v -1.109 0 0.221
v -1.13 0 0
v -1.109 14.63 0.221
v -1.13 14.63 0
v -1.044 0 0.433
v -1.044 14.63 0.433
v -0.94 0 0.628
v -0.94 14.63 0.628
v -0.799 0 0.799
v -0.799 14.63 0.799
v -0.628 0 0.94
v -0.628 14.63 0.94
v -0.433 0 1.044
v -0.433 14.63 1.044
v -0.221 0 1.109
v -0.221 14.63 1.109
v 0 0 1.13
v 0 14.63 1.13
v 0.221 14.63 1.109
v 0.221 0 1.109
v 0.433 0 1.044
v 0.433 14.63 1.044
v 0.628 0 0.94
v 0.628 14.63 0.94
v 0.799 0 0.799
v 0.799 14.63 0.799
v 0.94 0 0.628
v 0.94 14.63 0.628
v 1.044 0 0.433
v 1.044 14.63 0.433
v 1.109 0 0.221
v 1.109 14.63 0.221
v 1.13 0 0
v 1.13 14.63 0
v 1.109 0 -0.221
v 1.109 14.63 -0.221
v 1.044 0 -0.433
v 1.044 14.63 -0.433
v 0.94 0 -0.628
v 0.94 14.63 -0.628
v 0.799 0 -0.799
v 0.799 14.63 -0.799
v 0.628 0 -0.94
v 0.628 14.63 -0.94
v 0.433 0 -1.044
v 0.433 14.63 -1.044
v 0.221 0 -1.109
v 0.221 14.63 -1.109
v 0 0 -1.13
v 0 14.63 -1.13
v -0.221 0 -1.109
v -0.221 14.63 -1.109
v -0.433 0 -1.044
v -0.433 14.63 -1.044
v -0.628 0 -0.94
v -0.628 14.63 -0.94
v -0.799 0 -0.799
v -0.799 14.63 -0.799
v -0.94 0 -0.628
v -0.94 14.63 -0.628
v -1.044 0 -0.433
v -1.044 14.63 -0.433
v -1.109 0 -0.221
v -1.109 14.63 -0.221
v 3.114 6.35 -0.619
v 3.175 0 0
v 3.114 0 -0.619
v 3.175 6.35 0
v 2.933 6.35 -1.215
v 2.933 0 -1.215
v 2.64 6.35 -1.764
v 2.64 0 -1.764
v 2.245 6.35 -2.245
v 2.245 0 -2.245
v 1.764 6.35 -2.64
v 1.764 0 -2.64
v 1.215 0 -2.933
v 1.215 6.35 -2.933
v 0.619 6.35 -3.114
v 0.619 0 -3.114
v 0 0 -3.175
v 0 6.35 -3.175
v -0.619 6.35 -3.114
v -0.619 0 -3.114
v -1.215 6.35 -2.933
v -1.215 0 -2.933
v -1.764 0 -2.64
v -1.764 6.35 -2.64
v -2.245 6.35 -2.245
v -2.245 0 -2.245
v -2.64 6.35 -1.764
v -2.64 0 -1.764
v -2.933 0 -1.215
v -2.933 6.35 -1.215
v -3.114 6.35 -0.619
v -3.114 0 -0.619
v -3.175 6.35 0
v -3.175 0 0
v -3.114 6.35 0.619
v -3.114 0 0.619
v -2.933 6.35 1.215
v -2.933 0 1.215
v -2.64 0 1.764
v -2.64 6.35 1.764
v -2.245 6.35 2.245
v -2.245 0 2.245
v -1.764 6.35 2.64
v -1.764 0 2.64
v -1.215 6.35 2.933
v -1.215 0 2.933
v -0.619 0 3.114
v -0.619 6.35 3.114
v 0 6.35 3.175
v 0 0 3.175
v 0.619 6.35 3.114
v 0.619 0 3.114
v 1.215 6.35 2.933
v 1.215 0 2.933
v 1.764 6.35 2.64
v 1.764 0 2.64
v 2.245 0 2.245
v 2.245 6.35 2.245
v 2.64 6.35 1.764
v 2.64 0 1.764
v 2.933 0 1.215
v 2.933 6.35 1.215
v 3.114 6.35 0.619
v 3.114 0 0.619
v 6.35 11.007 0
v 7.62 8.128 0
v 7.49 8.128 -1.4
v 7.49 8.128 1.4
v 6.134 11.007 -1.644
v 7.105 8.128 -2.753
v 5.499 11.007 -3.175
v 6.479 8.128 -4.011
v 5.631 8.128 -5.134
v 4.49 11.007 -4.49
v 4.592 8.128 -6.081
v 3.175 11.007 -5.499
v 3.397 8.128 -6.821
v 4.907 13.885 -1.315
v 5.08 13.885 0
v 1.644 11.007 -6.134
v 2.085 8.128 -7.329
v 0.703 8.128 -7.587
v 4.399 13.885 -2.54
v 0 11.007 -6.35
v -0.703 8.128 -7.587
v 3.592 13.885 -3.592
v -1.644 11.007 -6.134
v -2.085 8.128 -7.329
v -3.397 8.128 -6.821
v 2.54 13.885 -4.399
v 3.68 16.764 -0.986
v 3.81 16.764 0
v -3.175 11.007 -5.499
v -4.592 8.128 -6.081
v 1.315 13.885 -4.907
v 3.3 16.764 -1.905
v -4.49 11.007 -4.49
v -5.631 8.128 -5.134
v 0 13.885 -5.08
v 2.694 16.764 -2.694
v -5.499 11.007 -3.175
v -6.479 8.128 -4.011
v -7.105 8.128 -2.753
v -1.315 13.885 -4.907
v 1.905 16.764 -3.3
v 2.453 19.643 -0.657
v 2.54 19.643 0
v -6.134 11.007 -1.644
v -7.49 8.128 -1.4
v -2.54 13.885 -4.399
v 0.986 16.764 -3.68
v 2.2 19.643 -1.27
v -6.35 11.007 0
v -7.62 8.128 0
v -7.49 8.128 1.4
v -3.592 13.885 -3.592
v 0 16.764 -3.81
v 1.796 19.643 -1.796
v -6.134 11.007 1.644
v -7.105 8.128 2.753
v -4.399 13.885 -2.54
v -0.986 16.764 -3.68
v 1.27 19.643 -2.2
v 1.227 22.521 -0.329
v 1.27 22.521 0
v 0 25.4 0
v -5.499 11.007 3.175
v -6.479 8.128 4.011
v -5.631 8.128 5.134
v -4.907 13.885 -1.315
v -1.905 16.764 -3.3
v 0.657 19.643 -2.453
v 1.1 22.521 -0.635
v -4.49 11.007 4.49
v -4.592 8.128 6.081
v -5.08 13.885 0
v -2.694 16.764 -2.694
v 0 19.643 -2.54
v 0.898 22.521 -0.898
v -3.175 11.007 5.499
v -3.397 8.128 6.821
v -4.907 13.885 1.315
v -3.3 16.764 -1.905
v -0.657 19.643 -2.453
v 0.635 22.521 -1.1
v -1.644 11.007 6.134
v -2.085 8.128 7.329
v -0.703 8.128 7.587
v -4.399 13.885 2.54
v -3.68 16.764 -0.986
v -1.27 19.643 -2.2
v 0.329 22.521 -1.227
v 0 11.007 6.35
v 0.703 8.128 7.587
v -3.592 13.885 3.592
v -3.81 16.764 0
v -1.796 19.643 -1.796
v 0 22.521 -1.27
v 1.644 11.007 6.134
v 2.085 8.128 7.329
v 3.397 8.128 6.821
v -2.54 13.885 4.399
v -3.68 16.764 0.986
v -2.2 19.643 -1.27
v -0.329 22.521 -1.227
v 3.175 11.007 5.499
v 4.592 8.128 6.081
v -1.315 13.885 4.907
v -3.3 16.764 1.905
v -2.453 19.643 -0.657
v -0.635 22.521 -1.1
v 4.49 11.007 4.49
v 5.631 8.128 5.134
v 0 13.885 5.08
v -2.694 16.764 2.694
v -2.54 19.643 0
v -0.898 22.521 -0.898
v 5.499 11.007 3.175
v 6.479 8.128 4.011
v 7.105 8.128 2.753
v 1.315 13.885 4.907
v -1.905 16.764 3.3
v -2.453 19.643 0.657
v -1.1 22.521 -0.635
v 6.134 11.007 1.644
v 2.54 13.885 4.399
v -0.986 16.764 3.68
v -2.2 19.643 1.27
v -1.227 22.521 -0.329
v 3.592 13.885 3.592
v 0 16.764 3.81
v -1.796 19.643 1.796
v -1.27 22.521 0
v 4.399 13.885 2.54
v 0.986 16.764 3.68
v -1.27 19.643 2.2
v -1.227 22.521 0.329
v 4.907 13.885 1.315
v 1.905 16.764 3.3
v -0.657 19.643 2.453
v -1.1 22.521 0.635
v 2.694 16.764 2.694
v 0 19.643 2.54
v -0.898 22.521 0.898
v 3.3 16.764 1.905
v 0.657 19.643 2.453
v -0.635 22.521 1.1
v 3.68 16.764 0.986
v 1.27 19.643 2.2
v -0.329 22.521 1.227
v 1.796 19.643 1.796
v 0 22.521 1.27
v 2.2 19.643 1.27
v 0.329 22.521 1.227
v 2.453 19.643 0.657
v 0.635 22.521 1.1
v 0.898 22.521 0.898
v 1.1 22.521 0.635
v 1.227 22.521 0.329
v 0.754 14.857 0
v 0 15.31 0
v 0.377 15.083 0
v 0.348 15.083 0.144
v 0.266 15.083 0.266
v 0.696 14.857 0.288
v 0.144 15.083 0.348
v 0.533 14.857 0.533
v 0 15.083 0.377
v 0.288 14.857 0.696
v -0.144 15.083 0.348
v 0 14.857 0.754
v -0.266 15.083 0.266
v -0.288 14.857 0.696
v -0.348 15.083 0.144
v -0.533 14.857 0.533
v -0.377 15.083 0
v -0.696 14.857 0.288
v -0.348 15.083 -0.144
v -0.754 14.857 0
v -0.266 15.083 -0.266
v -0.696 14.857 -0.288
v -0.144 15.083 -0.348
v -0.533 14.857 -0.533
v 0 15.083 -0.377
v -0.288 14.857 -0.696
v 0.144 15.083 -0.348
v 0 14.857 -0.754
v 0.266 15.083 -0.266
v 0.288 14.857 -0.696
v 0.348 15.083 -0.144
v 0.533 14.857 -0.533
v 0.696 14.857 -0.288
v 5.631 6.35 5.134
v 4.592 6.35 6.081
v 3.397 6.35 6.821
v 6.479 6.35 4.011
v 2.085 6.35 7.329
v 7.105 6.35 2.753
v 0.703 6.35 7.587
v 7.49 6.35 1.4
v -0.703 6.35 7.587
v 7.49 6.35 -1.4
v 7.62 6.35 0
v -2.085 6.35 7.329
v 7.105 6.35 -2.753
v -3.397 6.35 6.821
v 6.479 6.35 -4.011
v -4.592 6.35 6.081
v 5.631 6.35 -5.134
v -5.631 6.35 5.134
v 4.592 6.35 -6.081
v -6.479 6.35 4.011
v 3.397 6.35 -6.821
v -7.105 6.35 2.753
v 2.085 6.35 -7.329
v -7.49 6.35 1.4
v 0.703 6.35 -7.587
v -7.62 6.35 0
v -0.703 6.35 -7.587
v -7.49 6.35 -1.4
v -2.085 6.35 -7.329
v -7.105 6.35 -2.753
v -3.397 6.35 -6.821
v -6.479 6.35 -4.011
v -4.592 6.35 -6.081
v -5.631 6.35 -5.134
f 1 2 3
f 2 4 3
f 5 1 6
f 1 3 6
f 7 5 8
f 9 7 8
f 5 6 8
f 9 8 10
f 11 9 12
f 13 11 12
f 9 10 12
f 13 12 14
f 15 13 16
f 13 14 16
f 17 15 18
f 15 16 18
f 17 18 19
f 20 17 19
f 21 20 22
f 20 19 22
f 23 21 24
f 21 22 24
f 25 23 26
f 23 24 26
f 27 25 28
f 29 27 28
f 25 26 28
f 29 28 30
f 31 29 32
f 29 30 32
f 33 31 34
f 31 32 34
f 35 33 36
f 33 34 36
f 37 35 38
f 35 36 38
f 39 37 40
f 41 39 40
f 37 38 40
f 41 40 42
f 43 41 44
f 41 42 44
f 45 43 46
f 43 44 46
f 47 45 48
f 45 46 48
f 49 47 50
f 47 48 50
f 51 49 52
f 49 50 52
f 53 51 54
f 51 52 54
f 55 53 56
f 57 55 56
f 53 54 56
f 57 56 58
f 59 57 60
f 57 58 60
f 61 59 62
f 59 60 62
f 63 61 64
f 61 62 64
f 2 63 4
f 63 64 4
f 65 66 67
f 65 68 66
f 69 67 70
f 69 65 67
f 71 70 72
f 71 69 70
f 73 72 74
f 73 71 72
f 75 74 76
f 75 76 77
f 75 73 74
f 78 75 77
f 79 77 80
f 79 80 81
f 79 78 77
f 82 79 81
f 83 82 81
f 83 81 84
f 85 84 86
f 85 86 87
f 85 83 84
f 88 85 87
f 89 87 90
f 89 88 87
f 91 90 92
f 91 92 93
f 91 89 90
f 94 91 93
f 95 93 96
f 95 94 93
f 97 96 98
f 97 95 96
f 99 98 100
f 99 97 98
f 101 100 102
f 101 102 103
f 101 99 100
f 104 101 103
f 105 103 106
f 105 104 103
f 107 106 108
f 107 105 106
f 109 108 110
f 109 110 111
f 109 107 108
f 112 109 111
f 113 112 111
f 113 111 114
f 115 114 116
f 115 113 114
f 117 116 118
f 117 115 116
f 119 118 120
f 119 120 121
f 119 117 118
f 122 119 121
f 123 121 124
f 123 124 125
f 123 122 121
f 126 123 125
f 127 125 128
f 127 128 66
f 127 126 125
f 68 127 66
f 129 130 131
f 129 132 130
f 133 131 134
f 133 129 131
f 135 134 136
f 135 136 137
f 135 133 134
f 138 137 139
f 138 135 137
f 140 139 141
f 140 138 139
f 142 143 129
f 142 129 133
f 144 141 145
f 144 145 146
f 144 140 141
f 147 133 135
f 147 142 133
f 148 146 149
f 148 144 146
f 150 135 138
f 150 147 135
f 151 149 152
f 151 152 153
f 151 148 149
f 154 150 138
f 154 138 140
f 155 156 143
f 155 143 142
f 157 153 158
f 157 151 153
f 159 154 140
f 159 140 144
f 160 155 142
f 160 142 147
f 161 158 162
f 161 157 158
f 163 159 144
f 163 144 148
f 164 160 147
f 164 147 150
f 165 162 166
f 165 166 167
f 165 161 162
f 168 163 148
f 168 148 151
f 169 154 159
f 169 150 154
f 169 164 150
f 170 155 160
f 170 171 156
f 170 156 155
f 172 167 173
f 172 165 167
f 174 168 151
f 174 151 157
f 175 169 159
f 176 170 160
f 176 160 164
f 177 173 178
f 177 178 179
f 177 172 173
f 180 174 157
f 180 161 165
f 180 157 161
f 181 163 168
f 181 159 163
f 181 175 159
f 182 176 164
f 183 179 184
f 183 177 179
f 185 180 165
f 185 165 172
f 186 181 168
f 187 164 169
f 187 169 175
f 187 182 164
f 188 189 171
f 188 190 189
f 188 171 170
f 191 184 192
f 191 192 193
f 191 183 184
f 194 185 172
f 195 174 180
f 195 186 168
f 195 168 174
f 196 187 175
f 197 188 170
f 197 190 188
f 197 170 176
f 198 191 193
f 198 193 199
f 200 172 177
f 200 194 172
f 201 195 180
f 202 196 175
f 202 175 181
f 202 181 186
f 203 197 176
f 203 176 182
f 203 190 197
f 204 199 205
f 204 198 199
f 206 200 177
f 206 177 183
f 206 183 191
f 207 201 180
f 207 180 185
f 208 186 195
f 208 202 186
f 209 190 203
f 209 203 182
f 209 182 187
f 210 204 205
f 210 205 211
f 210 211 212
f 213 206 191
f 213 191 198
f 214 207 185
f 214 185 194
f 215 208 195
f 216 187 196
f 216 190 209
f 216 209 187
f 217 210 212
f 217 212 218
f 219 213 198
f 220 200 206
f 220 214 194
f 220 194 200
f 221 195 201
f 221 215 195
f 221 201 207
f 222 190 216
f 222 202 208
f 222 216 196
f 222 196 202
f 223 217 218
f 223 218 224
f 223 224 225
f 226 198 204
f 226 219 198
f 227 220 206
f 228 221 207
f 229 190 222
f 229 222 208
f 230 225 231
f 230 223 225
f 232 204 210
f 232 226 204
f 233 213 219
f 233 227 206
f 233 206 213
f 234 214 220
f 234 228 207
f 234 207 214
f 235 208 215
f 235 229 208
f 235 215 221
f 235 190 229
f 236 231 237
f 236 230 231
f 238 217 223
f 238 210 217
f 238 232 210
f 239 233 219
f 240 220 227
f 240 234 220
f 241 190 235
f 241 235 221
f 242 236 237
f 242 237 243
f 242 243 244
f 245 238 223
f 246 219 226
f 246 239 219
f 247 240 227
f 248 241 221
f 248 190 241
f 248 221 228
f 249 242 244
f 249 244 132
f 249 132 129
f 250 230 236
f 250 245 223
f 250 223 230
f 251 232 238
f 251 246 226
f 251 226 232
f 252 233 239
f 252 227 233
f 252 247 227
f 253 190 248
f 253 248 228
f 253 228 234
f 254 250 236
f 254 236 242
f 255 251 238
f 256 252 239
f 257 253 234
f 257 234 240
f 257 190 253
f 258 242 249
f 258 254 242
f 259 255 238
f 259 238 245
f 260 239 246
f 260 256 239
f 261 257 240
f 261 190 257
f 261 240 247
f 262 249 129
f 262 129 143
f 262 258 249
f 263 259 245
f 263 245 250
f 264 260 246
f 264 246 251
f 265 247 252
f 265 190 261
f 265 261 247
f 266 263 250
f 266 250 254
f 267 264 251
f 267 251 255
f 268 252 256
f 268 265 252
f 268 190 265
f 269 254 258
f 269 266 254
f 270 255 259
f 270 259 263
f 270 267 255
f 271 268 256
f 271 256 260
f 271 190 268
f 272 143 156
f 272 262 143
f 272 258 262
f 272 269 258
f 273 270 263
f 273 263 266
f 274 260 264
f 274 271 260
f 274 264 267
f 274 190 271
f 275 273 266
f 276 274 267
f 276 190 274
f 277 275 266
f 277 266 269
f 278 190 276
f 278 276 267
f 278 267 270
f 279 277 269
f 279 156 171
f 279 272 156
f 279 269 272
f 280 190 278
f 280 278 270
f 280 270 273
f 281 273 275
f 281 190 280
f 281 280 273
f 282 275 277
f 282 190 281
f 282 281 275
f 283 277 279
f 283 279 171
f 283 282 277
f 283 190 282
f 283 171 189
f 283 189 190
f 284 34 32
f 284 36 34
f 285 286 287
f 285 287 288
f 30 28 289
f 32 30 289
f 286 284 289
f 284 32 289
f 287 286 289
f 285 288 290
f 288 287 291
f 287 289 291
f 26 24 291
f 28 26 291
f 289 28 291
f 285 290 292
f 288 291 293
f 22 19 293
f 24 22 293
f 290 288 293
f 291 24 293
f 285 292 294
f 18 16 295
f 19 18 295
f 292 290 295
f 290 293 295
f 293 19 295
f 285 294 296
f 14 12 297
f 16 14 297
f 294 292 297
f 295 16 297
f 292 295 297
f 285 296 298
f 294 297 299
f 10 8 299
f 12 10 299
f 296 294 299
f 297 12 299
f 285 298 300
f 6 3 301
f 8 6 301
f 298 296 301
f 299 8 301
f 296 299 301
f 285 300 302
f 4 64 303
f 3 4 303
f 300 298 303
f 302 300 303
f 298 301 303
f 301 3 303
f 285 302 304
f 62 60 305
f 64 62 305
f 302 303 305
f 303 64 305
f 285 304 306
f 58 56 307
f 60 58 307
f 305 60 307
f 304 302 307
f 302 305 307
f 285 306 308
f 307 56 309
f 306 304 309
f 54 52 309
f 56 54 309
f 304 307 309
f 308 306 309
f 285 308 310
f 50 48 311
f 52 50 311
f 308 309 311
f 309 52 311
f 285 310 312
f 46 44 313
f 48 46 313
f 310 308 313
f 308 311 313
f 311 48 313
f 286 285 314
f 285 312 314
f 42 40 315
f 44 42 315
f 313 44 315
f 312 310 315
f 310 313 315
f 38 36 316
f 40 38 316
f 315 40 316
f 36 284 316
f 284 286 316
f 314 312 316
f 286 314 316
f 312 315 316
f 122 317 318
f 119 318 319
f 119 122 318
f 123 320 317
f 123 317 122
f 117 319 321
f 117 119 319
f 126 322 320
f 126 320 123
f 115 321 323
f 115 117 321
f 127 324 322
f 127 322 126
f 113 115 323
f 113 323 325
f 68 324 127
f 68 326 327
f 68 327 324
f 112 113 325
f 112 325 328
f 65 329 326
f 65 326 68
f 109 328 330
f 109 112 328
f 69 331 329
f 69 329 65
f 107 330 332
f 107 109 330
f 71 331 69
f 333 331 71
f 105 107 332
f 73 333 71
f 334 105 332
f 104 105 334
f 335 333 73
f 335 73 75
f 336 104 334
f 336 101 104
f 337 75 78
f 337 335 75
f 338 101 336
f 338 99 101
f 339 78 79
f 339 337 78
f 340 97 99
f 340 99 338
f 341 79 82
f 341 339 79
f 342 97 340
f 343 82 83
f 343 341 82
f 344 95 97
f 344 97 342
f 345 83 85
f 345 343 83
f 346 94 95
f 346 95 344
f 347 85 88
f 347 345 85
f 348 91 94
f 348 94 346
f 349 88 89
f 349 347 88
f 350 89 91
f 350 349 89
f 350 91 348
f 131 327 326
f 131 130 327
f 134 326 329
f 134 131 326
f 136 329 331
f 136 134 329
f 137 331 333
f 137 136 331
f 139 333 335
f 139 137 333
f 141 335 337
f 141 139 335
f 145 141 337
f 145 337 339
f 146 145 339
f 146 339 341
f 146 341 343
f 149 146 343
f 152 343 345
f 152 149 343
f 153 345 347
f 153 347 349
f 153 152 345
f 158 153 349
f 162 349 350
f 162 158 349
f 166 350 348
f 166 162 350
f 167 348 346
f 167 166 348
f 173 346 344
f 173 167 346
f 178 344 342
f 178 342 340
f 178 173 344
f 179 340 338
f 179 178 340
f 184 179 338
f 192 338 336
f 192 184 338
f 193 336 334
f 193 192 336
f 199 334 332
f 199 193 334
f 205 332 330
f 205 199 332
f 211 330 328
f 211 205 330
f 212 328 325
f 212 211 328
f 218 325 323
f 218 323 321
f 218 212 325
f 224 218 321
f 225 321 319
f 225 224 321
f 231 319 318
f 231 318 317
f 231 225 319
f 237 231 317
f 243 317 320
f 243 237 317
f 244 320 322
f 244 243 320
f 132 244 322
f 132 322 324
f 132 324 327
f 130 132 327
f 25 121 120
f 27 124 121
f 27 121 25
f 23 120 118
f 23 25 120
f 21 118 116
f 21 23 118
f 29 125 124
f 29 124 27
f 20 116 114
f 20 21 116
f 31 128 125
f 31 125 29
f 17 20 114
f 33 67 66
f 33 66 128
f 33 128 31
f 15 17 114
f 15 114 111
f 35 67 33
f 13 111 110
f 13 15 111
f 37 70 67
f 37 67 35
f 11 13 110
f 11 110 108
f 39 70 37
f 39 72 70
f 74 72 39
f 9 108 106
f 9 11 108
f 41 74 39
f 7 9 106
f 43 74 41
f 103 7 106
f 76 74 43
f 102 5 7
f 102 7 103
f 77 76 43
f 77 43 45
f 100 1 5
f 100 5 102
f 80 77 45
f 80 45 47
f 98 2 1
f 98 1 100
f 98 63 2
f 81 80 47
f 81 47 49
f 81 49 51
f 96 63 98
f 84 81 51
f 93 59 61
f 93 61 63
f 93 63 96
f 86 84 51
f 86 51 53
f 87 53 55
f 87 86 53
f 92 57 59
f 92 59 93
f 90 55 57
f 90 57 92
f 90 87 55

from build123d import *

# Parameters (mm, degrees)
F3_D     = 2.2606
F3_DEPTH = 14.6304
F3_TIP   = 0.6791527577


with BuildPart() as f1:
    # F0 (on Top) → F1 (revolve)
    with BuildSketch(Plane.XY):
        Polygon((0, 25.4), (0, 0), (3.175, 0), (3.175, 6.35), (7.62, 6.35), (7.62, 8.128), align=None)
    revolve(axis=Axis((0, 12.7, 0), (0, 1, 0)))

    # F3
    with Locations(Plane.XZ):
        with Locations((0, 0)):
            Hole(F3_D / 2, depth=F3_DEPTH)
            with Locations((0, 0, -(F3_DEPTH + F3_TIP / 2))):  # 118° drill point
                Cone(0, F3_D / 2, F3_TIP, mode=Mode.SUBTRACT)


solid = f1.part
